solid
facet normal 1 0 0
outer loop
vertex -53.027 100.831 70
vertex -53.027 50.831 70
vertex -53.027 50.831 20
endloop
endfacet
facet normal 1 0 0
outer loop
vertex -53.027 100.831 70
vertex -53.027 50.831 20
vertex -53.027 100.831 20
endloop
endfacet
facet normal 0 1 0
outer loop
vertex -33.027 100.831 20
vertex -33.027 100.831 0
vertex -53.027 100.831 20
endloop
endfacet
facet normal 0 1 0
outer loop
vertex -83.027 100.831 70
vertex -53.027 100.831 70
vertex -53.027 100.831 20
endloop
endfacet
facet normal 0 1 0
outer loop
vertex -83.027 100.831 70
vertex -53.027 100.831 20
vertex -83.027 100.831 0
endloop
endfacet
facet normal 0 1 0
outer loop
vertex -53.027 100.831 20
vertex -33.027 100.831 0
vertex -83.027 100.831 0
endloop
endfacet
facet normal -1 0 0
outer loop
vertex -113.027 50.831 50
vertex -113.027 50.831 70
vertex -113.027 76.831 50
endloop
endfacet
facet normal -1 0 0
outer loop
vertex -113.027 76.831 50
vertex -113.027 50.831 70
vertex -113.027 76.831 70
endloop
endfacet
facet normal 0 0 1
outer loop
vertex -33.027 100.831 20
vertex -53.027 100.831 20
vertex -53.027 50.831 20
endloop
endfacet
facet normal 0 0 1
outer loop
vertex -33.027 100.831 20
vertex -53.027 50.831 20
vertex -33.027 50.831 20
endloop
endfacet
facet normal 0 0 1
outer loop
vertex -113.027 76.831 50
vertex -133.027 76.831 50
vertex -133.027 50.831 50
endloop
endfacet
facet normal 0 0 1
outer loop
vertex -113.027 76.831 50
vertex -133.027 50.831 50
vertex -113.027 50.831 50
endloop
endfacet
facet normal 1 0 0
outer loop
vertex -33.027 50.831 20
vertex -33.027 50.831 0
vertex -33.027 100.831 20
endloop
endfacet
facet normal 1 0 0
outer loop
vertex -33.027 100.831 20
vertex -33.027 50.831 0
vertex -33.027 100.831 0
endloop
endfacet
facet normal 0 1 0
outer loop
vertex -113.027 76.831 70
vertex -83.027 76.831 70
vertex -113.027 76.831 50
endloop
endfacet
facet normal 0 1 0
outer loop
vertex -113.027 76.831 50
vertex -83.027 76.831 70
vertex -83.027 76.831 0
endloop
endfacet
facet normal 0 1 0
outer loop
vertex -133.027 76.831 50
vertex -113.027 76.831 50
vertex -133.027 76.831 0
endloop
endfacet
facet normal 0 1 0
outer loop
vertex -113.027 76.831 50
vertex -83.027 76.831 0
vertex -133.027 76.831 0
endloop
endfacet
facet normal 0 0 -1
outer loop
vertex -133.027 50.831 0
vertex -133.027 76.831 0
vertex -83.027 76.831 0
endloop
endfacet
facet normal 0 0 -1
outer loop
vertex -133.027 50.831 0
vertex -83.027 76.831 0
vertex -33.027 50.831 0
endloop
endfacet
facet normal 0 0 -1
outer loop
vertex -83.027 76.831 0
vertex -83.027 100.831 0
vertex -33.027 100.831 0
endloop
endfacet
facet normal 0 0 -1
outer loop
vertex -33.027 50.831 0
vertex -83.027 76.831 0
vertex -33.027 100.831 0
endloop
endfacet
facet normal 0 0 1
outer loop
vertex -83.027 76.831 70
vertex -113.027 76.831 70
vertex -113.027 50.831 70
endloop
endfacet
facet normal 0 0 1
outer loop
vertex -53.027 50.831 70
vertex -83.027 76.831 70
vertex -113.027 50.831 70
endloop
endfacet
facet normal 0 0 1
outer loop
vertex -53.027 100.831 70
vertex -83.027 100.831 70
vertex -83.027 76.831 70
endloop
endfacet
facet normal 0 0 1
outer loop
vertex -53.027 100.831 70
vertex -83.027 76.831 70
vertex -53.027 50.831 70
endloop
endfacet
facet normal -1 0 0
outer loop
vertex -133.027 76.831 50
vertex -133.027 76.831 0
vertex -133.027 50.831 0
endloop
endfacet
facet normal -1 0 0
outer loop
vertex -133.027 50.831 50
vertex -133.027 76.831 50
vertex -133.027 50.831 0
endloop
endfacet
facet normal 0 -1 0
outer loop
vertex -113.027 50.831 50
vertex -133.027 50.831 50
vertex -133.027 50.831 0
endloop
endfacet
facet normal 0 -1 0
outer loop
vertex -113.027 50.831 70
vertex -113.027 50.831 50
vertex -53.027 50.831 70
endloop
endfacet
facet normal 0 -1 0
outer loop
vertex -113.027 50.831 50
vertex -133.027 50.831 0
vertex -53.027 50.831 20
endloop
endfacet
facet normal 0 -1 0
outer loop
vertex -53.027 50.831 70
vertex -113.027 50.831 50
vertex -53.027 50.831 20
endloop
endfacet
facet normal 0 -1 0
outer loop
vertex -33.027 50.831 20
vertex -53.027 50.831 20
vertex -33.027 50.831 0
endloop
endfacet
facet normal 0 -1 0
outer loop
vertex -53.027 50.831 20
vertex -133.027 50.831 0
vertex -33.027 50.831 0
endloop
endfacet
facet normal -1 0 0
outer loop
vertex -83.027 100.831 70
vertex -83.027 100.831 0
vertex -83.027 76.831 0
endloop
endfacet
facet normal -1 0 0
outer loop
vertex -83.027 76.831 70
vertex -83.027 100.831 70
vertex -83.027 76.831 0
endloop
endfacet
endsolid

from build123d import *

# Parameters (mm, degrees)
BOSS_EXTRUDE1_DEPTH = 70
SKETCH2_W           = 20
SKETCH2_H           = 50
CUT_EXTRUDE1_DEPTH  = 50
SKETCH3_W           = 20
SKETCH3_H           = 26
CUT_EXTRUDE2_DEPTH  = 20


with BuildPart() as part:
    # Sketch1 → Boss-Extrude1 (new body)
    with BuildSketch(Plane.XY):
        Polygon((-33.026980357, 100.831089677), (-83.026980357, 100.831089677), (-83.026980357, 76.831089677), (-133.026980357, 76.831089677), (-133.026980357, 50.831089677), (-33.026980357, 50.831089677), align=None)
    extrude(amount=BOSS_EXTRUDE1_DEPTH)

    # Sketch2 → Cut-Extrude1 (cut)
    with BuildSketch(Plane.XY.offset(70)):
        with Locations((-43.026980357, 75.831089677)):
            Rectangle(SKETCH2_W, SKETCH2_H)
    extrude(amount=-CUT_EXTRUDE1_DEPTH, mode=Mode.SUBTRACT)

    # Sketch3 → Cut-Extrude2 (cut)
    with BuildSketch(Plane.XY.offset(70)):
        with Locations((-123.026980357, 63.831089677)):
            Rectangle(SKETCH3_W, SKETCH3_H)
    extrude(amount=-CUT_EXTRUDE2_DEPTH, mode=Mode.SUBTRACT)


solid = part.part
